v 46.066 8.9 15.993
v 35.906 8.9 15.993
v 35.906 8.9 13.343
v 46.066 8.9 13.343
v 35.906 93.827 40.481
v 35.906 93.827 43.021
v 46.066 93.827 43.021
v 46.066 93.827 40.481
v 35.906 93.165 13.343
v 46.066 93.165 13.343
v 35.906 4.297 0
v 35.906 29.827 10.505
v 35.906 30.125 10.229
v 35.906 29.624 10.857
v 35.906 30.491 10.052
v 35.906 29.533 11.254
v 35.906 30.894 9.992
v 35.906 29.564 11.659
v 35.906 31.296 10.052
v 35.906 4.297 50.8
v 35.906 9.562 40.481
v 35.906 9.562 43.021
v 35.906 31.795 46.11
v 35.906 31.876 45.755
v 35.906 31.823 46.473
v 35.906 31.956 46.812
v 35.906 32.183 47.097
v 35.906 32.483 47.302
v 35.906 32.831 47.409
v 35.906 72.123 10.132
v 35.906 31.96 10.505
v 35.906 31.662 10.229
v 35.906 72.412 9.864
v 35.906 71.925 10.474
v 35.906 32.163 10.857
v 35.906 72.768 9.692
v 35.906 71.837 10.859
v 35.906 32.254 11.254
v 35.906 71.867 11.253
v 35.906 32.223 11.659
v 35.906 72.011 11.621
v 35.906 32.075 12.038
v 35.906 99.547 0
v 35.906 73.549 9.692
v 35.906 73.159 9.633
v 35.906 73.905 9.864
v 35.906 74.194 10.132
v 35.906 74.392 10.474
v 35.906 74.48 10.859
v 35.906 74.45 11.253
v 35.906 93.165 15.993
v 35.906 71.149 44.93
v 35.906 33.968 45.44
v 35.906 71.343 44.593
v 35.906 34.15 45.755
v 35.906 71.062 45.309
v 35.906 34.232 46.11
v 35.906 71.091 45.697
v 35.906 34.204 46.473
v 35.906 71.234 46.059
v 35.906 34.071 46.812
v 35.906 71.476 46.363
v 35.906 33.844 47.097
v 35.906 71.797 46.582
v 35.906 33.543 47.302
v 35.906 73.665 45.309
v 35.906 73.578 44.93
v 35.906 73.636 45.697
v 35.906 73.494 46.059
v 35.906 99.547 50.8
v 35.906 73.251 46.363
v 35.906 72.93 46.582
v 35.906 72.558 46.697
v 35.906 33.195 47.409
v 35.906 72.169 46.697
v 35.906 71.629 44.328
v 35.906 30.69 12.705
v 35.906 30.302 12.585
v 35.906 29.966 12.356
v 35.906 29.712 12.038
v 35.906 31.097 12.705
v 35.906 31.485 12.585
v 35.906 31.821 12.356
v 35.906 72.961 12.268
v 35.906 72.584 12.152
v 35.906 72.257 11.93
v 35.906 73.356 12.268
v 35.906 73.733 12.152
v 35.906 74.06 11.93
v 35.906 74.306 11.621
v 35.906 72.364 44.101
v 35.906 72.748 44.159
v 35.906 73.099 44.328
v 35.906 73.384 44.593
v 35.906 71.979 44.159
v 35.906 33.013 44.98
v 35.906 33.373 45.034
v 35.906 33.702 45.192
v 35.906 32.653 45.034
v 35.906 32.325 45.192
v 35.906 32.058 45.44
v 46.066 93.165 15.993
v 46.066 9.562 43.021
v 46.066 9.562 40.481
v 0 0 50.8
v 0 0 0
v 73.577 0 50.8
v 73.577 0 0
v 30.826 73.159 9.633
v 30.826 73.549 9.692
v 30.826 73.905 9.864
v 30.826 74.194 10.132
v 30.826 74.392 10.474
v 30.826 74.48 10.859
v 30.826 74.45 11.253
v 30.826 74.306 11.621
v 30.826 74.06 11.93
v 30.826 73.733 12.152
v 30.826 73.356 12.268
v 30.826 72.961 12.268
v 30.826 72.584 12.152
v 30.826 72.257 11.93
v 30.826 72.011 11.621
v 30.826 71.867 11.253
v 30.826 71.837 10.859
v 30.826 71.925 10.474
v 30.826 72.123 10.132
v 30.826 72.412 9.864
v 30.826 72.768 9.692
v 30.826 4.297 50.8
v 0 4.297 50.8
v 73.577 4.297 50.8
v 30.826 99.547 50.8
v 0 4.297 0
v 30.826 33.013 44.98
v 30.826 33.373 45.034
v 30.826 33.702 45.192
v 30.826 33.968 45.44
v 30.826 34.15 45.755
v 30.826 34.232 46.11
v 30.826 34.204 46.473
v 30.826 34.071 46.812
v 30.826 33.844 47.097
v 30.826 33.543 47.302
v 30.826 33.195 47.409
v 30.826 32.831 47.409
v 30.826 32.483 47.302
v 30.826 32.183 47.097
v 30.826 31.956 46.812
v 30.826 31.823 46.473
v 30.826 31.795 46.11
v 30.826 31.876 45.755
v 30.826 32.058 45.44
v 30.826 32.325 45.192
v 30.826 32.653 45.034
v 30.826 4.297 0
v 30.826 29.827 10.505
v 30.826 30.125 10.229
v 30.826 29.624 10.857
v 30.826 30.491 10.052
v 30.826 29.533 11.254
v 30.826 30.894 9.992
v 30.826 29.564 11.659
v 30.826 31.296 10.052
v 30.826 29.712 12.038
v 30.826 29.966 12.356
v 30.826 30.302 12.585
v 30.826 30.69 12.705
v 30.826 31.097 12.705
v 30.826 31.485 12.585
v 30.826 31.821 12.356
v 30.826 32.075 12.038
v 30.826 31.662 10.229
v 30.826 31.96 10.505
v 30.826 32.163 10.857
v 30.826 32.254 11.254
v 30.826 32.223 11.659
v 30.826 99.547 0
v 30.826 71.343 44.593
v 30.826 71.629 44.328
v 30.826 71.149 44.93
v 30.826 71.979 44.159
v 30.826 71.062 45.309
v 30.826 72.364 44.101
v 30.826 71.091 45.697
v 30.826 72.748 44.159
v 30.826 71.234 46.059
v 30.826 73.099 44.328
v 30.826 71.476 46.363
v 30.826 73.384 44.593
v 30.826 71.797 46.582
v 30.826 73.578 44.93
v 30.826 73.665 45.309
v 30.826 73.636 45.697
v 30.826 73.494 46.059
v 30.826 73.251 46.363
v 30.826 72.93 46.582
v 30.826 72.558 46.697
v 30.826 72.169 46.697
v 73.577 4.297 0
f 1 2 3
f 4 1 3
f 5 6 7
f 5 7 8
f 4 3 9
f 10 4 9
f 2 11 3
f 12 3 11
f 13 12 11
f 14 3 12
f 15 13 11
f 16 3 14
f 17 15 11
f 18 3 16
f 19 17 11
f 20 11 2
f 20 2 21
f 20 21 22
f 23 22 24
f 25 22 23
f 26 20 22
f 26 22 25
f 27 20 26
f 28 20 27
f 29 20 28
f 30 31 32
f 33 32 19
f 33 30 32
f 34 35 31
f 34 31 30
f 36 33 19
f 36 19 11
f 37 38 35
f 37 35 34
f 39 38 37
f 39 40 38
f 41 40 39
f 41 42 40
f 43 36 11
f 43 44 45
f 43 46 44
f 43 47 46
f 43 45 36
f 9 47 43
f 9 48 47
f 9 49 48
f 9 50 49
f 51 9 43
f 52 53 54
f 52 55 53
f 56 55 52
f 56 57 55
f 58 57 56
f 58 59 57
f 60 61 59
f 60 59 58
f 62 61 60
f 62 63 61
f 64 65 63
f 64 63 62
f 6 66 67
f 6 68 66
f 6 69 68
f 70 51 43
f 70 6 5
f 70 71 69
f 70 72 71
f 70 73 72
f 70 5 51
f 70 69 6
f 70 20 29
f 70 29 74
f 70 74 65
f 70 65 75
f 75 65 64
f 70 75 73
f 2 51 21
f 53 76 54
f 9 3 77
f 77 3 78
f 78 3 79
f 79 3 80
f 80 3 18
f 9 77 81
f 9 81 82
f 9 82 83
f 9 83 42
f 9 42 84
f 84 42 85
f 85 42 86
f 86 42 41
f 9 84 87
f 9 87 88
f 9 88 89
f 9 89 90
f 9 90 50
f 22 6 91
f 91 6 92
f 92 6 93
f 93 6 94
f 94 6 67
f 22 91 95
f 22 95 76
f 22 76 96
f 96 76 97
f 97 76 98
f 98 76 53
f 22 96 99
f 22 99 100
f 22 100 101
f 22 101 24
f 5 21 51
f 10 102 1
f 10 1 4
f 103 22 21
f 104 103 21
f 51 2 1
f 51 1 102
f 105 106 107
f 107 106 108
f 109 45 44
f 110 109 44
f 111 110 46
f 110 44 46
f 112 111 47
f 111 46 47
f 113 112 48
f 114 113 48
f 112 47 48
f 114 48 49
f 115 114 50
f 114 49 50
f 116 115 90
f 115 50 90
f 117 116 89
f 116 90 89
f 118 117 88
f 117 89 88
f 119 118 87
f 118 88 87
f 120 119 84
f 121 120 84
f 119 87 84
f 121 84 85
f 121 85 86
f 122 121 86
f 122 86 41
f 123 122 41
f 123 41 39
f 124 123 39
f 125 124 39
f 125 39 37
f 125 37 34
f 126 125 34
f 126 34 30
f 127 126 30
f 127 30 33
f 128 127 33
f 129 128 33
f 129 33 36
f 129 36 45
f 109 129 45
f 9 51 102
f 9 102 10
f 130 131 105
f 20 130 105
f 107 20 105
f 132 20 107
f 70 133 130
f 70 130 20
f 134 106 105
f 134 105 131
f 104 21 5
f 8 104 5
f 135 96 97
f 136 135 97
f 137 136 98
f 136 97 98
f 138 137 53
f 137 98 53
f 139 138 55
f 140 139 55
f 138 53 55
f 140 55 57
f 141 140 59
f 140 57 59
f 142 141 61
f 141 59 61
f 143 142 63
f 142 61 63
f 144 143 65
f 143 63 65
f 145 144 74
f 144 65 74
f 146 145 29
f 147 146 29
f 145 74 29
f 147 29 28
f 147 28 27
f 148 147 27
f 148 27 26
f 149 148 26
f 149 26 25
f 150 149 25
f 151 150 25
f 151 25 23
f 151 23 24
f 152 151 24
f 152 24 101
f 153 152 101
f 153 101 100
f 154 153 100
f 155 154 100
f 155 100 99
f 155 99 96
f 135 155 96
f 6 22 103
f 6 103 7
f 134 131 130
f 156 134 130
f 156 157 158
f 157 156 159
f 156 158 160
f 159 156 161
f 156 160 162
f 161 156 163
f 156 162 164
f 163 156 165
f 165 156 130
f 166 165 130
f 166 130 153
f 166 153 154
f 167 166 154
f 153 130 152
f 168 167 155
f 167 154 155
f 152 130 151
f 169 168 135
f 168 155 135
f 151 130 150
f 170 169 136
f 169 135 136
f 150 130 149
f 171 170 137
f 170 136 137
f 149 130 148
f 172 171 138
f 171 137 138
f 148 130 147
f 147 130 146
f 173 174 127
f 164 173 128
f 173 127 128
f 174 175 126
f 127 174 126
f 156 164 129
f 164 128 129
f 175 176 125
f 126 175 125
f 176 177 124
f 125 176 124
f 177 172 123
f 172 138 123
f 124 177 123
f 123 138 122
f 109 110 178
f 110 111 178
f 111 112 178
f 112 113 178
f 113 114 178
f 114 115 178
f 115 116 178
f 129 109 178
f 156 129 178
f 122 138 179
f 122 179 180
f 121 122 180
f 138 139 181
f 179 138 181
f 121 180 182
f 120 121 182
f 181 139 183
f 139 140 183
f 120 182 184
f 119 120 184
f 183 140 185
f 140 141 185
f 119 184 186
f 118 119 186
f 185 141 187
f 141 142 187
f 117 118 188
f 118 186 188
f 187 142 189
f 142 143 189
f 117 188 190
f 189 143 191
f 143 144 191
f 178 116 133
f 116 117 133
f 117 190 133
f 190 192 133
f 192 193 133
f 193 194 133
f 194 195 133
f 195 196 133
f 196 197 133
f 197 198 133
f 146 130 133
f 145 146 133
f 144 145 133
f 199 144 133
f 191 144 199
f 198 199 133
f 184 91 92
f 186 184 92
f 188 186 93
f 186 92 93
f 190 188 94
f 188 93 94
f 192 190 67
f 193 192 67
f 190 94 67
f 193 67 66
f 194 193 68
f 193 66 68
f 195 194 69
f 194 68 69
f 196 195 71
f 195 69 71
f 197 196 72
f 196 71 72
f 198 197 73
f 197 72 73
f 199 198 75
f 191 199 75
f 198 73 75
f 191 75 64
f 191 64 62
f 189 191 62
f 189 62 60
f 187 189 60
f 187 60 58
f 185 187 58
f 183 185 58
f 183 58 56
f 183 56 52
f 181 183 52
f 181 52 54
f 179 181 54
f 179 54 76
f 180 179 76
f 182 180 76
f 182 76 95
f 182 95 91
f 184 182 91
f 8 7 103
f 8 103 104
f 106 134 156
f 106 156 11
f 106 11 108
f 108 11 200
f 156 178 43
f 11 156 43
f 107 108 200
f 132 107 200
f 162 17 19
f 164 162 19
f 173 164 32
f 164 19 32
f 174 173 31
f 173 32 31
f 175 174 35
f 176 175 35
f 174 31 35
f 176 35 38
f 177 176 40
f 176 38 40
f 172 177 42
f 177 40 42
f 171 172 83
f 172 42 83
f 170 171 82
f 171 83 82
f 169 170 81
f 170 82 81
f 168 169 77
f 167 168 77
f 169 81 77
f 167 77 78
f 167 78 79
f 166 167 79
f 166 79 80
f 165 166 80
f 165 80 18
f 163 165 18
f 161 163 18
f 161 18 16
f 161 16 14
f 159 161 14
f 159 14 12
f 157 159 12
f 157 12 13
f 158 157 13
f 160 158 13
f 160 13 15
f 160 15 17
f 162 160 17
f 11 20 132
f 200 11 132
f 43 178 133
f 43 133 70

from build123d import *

# Parameters (mm, degrees)
SKETCH5_W           = 73.577123652
SKETCH5_H           = 99.547402554
BOSS_EXTRUDE2_DEPTH = 50.8
SKETCH6_W           = 30.82640112
SKETCH6_H           = 95.25
CUT_EXTRUDE3_DEPTH  = 50.8
SKETCH7_W           = 37.670722532
SKETCH7_H           = 95.25
CUT_EXTRUDE4_DEPTH  = 50.8
SKETCH8_W           = 2.54
SKETCH8_H           = 84.265204652
BOSS_EXTRUDE3_DEPTH = 10.16
SKETCH9_W           = 2.649849203
SKETCH9_H           = 84.265204652
BOSS_EXTRUDE4_DEPTH = 10.16
SKETCH10_R          = 1.3048994
CUT_EXTRUDE5_DEPTH  = 10.16
SKETCH11_R          = 1.324924601
CUT_EXTRUDE6_DEPTH  = 10.16
SKETCH12_R          = 1.221520127
CUT_EXTRUDE7_DEPTH  = 10.16
SKETCH13_R          = 1.364093366
CUT_EXTRUDE8_DEPTH  = 10.16


with BuildPart() as part:
    # Sketch5 → Boss-Extrude2 (new body)
    with BuildSketch(Plane.XY):
        with Locations((36.788561826, 49.773701277)):
            Rectangle(SKETCH5_W, SKETCH5_H)
    extrude(amount=BOSS_EXTRUDE2_DEPTH)

    # Sketch6 → Cut-Extrude3 (cut)
    with BuildSketch(Plane.XY.offset(50.8)):
        with Locations((15.41320056, 51.922402554)):
            Rectangle(SKETCH6_W, SKETCH6_H)
    extrude(amount=-CUT_EXTRUDE3_DEPTH, mode=Mode.SUBTRACT)

    # Sketch7 → Cut-Extrude4 (cut)
    with BuildSketch(Plane.XY.offset(50.8)):
        with Locations((54.741762386, 51.922402554)):
            Rectangle(SKETCH7_W, SKETCH7_H)
    extrude(amount=-CUT_EXTRUDE4_DEPTH, mode=Mode.SUBTRACT)

    # Sketch8 → Boss-Extrude3 (add)
    with BuildSketch(Plane(origin=(35.90640112, 0, 0), x_dir=(0, 0, -1), z_dir=(1, 0, 0))):
        with Locations((-41.751497199, 51.694841949)):
            Rectangle(SKETCH8_W, SKETCH8_H)
    extrude(amount=BOSS_EXTRUDE3_DEPTH)

    # Sketch9 → Boss-Extrude4 (add)
    with BuildSketch(Plane(origin=(35.90640112, 0, 0), x_dir=(0, 0, -1), z_dir=(1, 0, 0))):
        with Locations((-14.668110729, 51.032379648)):
            Rectangle(SKETCH9_W, SKETCH9_H)
    extrude(amount=BOSS_EXTRUDE4_DEPTH)

    # Sketch10 → Cut-Extrude5 (cut)
    with BuildSketch(Plane(origin=(35.90640112, 0, 0), x_dir=(0, 0, -1), z_dir=(1, 0, 0))):
        with Locations((-45.406361482, 72.363665732)):
            Circle(SKETCH10_R)
    extrude(amount=-CUT_EXTRUDE5_DEPTH, mode=Mode.SUBTRACT)

    # Sketch11 → Cut-Extrude6 (cut)
    with BuildSketch(Plane(origin=(35.90640112, 0, 0), x_dir=(0, 0, -1), z_dir=(1, 0, 0))):
        with Locations((-10.958321844, 73.158620492)):
            Circle(SKETCH11_R)
    extrude(amount=-CUT_EXTRUDE6_DEPTH, mode=Mode.SUBTRACT)

    # Sketch12 → Cut-Extrude7 (cut)
    with BuildSketch(Plane(origin=(35.90640112, 0, 0), x_dir=(0, 0, -1), z_dir=(1, 0, 0))):
        with Locations((-46.201316243, 33.013405069)):
            Circle(SKETCH12_R)
    extrude(amount=-CUT_EXTRUDE7_DEPTH, mode=Mode.SUBTRACT)

    # Sketch13 → Cut-Extrude8 (cut)
    with BuildSketch(Plane(origin=(35.90640112, 0, 0), x_dir=(0, 0, -1), z_dir=(1, 0, 0))):
        with Locations((-11.355799225, 30.893525706)):
            Circle(SKETCH13_R)
    extrude(amount=-CUT_EXTRUDE8_DEPTH, mode=Mode.SUBTRACT)


solid = part.part
